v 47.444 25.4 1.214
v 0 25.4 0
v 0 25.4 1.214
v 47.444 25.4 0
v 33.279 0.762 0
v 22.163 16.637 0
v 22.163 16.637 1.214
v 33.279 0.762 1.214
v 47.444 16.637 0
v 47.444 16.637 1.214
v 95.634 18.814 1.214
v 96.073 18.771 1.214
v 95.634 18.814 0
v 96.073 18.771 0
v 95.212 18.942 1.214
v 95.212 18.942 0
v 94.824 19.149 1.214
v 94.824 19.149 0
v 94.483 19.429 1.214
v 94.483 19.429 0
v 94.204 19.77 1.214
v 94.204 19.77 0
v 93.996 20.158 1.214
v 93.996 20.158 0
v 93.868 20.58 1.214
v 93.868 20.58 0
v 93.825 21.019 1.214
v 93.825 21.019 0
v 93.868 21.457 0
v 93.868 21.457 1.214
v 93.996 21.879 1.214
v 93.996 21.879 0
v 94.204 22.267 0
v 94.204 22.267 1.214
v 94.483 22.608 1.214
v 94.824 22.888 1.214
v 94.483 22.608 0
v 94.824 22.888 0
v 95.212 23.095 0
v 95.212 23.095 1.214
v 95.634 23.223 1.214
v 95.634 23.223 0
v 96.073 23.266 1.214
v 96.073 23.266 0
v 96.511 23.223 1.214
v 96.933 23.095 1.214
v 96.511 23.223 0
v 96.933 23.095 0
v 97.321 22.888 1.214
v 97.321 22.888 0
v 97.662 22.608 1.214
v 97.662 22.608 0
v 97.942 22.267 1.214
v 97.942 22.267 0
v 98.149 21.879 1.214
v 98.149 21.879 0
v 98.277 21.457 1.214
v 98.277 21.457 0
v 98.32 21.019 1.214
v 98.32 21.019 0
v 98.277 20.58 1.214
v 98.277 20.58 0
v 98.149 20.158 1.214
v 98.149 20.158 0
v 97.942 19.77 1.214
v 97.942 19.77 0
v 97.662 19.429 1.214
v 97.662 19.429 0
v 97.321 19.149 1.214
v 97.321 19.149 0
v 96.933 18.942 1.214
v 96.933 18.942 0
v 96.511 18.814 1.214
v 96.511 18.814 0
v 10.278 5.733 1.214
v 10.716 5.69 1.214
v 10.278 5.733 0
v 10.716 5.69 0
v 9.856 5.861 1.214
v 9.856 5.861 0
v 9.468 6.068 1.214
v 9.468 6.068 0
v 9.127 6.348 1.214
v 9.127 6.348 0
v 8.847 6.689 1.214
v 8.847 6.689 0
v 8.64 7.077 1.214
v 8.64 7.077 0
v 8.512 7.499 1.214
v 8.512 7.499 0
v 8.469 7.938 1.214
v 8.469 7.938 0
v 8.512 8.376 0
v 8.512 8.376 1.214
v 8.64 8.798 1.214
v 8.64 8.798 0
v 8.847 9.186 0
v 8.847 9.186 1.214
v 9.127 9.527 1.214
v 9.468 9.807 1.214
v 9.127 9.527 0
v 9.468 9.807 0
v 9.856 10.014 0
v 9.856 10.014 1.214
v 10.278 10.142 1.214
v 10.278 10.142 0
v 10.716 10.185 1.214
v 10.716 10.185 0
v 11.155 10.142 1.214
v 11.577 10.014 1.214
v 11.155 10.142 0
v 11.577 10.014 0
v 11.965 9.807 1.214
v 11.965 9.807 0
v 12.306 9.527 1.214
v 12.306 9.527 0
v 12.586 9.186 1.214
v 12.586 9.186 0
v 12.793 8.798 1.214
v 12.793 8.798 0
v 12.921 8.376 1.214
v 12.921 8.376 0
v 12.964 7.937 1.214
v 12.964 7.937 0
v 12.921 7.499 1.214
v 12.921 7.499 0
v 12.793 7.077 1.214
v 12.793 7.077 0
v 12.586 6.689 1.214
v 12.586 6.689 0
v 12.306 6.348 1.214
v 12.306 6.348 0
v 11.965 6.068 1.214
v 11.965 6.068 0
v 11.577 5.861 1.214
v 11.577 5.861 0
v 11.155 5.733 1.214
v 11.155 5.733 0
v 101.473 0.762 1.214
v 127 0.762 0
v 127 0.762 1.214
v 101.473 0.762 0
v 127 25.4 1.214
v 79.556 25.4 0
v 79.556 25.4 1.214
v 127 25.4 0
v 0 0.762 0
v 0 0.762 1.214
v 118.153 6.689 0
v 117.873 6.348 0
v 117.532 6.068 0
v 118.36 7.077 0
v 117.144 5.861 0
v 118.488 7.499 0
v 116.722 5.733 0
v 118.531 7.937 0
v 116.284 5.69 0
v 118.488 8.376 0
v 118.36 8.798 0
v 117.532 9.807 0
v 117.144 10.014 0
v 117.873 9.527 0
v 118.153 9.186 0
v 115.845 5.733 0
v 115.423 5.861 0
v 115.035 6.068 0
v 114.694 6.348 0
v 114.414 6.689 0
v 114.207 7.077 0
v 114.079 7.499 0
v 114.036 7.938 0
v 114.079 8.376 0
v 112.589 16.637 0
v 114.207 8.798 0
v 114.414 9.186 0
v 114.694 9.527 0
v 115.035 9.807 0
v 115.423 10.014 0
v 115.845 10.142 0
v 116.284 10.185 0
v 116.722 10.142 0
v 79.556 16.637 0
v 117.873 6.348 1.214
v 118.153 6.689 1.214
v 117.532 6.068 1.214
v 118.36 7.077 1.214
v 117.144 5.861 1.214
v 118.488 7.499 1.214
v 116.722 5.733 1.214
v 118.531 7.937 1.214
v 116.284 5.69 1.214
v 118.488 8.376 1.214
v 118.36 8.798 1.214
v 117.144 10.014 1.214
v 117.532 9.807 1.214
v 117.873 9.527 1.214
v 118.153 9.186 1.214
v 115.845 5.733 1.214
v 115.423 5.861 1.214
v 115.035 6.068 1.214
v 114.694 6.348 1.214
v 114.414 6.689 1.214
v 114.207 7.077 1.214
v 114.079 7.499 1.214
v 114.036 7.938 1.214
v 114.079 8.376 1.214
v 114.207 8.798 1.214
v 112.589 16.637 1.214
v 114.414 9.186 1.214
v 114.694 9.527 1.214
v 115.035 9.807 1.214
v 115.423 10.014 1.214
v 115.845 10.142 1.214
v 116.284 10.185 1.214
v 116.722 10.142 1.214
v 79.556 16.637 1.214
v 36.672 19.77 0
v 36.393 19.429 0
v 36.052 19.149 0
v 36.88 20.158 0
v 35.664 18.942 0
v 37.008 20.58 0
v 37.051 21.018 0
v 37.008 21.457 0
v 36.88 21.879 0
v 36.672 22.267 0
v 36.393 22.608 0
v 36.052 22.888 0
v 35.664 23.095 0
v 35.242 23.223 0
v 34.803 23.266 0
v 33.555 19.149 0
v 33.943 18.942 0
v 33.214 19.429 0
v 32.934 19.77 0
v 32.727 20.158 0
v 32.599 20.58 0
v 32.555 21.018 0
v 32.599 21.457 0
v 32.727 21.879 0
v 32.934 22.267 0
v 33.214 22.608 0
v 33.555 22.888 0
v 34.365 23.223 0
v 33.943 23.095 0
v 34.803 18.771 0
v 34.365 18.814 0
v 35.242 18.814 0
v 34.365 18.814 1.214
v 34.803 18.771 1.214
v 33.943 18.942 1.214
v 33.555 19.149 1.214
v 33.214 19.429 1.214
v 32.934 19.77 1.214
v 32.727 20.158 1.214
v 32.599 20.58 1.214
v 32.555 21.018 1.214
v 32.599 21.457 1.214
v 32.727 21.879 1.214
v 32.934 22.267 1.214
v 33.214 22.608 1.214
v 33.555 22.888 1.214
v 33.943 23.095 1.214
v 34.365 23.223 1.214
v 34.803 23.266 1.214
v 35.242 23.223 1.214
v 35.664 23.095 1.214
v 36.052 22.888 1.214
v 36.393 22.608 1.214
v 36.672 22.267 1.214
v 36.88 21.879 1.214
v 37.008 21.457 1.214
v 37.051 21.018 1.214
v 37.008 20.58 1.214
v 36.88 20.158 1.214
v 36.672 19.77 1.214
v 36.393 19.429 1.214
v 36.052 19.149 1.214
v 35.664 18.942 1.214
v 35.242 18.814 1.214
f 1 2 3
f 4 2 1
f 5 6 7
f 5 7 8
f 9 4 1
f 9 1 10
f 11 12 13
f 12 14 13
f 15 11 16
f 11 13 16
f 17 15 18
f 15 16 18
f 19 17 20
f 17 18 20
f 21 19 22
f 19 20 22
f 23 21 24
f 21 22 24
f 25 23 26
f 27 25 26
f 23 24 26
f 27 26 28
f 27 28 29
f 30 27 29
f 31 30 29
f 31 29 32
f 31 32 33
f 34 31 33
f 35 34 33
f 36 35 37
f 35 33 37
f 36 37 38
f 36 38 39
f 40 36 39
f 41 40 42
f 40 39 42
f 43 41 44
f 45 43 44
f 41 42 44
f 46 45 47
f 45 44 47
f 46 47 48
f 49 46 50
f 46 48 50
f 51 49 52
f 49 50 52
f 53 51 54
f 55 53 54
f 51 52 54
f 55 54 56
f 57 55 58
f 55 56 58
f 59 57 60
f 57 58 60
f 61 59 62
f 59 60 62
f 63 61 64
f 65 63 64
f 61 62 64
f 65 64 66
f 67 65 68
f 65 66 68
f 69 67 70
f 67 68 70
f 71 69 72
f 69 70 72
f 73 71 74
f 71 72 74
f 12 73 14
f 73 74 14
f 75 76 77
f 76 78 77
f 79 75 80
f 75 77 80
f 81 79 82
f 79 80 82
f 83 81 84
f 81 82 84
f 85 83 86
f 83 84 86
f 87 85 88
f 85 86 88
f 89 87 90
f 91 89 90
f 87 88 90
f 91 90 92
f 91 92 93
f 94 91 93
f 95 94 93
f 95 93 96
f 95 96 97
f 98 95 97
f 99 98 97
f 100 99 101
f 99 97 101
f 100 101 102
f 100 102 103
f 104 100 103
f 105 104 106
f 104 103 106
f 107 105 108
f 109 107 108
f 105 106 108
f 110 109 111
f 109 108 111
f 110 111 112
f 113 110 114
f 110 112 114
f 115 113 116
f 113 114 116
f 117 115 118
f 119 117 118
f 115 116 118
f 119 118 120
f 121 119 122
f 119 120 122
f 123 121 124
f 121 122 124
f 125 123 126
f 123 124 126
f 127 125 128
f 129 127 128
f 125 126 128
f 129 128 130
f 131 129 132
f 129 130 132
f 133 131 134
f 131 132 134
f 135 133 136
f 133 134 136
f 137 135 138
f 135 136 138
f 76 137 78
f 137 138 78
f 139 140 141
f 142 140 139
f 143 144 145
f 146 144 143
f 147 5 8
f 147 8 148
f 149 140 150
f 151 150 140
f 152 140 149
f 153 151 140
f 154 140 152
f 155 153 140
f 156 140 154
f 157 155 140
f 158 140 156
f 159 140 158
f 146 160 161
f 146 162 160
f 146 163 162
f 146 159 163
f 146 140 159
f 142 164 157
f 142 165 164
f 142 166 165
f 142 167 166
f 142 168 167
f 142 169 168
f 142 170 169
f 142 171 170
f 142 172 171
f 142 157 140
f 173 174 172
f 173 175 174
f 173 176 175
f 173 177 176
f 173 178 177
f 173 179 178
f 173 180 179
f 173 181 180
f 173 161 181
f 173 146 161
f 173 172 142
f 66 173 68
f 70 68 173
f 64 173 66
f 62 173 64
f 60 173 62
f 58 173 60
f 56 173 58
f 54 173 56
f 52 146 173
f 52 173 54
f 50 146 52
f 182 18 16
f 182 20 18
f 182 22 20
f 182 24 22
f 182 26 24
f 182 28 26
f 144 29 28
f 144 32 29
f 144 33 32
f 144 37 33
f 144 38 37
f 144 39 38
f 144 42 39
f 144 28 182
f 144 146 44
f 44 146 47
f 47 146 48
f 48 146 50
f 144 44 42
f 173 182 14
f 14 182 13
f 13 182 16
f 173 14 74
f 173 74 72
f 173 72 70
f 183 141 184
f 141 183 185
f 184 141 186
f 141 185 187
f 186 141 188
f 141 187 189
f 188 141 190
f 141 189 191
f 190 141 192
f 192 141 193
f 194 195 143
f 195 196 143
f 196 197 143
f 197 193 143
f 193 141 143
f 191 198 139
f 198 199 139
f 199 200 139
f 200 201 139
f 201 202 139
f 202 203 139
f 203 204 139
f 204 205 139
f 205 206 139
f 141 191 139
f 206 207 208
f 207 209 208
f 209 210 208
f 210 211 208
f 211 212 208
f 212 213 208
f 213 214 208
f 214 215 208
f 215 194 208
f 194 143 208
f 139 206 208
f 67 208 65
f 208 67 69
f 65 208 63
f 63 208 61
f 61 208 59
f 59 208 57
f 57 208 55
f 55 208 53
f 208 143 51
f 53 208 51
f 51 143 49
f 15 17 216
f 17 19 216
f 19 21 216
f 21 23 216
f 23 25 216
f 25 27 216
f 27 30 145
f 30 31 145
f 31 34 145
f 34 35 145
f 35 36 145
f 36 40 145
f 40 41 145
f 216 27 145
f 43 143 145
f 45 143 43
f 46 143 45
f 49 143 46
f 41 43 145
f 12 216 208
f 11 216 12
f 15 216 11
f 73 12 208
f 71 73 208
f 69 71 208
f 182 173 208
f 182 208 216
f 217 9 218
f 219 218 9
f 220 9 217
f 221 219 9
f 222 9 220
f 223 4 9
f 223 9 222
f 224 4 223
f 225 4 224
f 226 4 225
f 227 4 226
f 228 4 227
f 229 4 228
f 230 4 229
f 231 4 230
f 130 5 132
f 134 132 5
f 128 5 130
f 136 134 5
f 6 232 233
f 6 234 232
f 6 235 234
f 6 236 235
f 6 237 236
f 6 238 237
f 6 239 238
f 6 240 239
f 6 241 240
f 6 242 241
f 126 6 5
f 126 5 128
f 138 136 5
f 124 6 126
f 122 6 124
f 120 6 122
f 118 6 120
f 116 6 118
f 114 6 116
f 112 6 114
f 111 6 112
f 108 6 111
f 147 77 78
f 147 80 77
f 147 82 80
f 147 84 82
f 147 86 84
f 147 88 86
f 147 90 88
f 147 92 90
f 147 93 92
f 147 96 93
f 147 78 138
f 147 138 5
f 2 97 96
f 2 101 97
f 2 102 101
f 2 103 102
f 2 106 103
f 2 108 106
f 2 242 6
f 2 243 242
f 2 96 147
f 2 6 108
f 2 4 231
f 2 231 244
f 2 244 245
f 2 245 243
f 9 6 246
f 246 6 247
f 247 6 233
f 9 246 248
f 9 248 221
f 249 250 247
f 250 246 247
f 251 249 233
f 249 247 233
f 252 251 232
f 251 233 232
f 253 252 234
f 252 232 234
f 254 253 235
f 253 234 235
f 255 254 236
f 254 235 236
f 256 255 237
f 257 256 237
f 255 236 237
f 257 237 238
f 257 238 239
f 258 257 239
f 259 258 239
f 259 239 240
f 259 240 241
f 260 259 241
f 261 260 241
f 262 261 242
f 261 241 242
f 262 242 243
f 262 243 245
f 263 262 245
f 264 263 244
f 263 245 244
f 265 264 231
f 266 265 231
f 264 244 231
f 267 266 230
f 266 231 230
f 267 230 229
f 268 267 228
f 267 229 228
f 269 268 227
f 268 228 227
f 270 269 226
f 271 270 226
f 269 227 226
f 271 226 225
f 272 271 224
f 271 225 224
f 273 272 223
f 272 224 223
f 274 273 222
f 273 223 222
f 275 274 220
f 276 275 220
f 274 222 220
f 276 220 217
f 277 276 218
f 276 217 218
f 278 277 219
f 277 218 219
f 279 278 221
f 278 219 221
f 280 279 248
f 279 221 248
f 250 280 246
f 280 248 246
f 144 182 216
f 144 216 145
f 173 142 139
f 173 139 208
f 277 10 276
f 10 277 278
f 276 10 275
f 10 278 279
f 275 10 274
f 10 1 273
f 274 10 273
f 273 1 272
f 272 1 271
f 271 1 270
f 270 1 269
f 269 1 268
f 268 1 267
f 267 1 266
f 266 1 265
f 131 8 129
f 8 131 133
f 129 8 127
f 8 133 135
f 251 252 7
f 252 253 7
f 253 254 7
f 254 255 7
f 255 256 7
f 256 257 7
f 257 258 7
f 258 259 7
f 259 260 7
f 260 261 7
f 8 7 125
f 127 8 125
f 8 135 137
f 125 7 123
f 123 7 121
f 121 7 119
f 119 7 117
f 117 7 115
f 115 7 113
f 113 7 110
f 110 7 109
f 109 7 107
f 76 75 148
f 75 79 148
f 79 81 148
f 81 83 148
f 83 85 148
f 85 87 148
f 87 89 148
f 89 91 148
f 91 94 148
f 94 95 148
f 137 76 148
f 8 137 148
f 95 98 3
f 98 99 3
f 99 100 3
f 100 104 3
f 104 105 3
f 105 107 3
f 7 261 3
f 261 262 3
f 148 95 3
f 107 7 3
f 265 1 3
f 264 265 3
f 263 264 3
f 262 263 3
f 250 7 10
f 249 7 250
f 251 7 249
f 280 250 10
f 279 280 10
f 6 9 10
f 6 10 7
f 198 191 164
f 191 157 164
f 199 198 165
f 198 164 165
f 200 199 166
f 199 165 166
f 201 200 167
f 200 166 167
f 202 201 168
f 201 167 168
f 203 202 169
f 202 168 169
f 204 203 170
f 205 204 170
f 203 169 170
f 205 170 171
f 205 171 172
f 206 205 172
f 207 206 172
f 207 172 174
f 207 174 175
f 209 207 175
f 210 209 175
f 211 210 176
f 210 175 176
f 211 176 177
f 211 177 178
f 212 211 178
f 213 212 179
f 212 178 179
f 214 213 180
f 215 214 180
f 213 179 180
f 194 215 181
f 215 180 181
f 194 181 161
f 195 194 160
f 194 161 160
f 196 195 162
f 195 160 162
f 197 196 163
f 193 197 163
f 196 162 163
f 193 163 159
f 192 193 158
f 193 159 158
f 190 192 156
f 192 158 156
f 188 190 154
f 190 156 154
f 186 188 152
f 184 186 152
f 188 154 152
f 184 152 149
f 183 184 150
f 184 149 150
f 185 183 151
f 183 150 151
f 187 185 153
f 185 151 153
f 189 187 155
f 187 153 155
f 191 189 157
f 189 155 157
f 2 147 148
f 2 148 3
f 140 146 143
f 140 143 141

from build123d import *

# Parameters (mm, degrees)
BOSS_EXTRUDE1_DEPTH            = 1.21412
BOSS_EXTRUDE1_2_DEPTH          = 1.21412
SKETCH3_W                      = 2.2479
SKETCH3_H                      = 1.21412
F_8_CLEARANCE_HOLE1_AT_2_COUNT = 2
F_8_CLEARANCE_HOLE1_AT_2_PITCH = 27.409736217
F_8_CLEARANCE_HOLE1_AT_3_COUNT = 2
F_8_CLEARANCE_HOLE1_AT_3_PITCH = 86.352641558
F_8_CLEARANCE_HOLE1_AT_4_COUNT = 2
F_8_CLEARANCE_HOLE1_AT_4_PITCH = 105.567102665


with BuildPart() as part:
    # Sketch1 → Boss-Extrude1 (new body)
    with BuildSketch(Plane.XY):
        Polygon((0, 25.4), (47.443663681, 25.4), (47.443663681, 16.637), (22.163130258, 16.637), (33.278924927, 0.762), (0, 0.762), align=None)
    extrude(amount=BOSS_EXTRUDE1_DEPTH)

    # Sketch3 → #8 Clearance Hole1 (revolve, cut)
    with BuildSketch(Plane(origin=(10.716448667, 7.9375, 1.21412), x_dir=(0, -1, 0), z_dir=(1, 0, 0))):
        with Locations((1.12395, 0.60706)):
            Rectangle(SKETCH3_W, SKETCH3_H)
    f_8_clearance_hole1 = revolve(axis=Axis((10.716448667, 7.9375, 7.56412), (0, 0, -1)), mode=Mode.SUBTRACT)

    # #8 Clearance Hole1 at 2: #8 Clearance Hole1 ×2
    with Locations(*[Vector(0.8787734442616352, 0.4772391786730663, 0) * (i * F_8_CLEARANCE_HOLE1_AT_2_PITCH) for i in range(1, F_8_CLEARANCE_HOLE1_AT_2_COUNT)]):
        add(f_8_clearance_hole1, mode=Mode.SUBTRACT)


with BuildPart() as body_2:
    # Sketch1 → Boss-Extrude1 2 (new body)
    with BuildSketch(Plane.XY):
        Polygon((79.556336319, 25.4), (127, 25.4), (127, 0.762), (101.472993712, 0.762), (112.588788381, 16.637), (79.556336319, 16.637), align=None)
    extrude(amount=BOSS_EXTRUDE1_2_DEPTH)

    # #8 Clearance Hole1 at 3: #8 Clearance Hole1 ×2
    with Locations(*[Vector(0.9884597870181576, 0.1514834956291232, 0) * (i * F_8_CLEARANCE_HOLE1_AT_3_PITCH) for i in range(1, F_8_CLEARANCE_HOLE1_AT_3_COUNT)]):
        add(f_8_clearance_hole1, mode=Mode.SUBTRACT)

    # #8 Clearance Hole1 at 4: #8 Clearance Hole1 ×2
    with Locations(*[(i * F_8_CLEARANCE_HOLE1_AT_4_PITCH, 0, 0) for i in range(1, F_8_CLEARANCE_HOLE1_AT_4_COUNT)]):
        add(f_8_clearance_hole1, mode=Mode.SUBTRACT)


solid = Compound([part.part, body_2.part])
